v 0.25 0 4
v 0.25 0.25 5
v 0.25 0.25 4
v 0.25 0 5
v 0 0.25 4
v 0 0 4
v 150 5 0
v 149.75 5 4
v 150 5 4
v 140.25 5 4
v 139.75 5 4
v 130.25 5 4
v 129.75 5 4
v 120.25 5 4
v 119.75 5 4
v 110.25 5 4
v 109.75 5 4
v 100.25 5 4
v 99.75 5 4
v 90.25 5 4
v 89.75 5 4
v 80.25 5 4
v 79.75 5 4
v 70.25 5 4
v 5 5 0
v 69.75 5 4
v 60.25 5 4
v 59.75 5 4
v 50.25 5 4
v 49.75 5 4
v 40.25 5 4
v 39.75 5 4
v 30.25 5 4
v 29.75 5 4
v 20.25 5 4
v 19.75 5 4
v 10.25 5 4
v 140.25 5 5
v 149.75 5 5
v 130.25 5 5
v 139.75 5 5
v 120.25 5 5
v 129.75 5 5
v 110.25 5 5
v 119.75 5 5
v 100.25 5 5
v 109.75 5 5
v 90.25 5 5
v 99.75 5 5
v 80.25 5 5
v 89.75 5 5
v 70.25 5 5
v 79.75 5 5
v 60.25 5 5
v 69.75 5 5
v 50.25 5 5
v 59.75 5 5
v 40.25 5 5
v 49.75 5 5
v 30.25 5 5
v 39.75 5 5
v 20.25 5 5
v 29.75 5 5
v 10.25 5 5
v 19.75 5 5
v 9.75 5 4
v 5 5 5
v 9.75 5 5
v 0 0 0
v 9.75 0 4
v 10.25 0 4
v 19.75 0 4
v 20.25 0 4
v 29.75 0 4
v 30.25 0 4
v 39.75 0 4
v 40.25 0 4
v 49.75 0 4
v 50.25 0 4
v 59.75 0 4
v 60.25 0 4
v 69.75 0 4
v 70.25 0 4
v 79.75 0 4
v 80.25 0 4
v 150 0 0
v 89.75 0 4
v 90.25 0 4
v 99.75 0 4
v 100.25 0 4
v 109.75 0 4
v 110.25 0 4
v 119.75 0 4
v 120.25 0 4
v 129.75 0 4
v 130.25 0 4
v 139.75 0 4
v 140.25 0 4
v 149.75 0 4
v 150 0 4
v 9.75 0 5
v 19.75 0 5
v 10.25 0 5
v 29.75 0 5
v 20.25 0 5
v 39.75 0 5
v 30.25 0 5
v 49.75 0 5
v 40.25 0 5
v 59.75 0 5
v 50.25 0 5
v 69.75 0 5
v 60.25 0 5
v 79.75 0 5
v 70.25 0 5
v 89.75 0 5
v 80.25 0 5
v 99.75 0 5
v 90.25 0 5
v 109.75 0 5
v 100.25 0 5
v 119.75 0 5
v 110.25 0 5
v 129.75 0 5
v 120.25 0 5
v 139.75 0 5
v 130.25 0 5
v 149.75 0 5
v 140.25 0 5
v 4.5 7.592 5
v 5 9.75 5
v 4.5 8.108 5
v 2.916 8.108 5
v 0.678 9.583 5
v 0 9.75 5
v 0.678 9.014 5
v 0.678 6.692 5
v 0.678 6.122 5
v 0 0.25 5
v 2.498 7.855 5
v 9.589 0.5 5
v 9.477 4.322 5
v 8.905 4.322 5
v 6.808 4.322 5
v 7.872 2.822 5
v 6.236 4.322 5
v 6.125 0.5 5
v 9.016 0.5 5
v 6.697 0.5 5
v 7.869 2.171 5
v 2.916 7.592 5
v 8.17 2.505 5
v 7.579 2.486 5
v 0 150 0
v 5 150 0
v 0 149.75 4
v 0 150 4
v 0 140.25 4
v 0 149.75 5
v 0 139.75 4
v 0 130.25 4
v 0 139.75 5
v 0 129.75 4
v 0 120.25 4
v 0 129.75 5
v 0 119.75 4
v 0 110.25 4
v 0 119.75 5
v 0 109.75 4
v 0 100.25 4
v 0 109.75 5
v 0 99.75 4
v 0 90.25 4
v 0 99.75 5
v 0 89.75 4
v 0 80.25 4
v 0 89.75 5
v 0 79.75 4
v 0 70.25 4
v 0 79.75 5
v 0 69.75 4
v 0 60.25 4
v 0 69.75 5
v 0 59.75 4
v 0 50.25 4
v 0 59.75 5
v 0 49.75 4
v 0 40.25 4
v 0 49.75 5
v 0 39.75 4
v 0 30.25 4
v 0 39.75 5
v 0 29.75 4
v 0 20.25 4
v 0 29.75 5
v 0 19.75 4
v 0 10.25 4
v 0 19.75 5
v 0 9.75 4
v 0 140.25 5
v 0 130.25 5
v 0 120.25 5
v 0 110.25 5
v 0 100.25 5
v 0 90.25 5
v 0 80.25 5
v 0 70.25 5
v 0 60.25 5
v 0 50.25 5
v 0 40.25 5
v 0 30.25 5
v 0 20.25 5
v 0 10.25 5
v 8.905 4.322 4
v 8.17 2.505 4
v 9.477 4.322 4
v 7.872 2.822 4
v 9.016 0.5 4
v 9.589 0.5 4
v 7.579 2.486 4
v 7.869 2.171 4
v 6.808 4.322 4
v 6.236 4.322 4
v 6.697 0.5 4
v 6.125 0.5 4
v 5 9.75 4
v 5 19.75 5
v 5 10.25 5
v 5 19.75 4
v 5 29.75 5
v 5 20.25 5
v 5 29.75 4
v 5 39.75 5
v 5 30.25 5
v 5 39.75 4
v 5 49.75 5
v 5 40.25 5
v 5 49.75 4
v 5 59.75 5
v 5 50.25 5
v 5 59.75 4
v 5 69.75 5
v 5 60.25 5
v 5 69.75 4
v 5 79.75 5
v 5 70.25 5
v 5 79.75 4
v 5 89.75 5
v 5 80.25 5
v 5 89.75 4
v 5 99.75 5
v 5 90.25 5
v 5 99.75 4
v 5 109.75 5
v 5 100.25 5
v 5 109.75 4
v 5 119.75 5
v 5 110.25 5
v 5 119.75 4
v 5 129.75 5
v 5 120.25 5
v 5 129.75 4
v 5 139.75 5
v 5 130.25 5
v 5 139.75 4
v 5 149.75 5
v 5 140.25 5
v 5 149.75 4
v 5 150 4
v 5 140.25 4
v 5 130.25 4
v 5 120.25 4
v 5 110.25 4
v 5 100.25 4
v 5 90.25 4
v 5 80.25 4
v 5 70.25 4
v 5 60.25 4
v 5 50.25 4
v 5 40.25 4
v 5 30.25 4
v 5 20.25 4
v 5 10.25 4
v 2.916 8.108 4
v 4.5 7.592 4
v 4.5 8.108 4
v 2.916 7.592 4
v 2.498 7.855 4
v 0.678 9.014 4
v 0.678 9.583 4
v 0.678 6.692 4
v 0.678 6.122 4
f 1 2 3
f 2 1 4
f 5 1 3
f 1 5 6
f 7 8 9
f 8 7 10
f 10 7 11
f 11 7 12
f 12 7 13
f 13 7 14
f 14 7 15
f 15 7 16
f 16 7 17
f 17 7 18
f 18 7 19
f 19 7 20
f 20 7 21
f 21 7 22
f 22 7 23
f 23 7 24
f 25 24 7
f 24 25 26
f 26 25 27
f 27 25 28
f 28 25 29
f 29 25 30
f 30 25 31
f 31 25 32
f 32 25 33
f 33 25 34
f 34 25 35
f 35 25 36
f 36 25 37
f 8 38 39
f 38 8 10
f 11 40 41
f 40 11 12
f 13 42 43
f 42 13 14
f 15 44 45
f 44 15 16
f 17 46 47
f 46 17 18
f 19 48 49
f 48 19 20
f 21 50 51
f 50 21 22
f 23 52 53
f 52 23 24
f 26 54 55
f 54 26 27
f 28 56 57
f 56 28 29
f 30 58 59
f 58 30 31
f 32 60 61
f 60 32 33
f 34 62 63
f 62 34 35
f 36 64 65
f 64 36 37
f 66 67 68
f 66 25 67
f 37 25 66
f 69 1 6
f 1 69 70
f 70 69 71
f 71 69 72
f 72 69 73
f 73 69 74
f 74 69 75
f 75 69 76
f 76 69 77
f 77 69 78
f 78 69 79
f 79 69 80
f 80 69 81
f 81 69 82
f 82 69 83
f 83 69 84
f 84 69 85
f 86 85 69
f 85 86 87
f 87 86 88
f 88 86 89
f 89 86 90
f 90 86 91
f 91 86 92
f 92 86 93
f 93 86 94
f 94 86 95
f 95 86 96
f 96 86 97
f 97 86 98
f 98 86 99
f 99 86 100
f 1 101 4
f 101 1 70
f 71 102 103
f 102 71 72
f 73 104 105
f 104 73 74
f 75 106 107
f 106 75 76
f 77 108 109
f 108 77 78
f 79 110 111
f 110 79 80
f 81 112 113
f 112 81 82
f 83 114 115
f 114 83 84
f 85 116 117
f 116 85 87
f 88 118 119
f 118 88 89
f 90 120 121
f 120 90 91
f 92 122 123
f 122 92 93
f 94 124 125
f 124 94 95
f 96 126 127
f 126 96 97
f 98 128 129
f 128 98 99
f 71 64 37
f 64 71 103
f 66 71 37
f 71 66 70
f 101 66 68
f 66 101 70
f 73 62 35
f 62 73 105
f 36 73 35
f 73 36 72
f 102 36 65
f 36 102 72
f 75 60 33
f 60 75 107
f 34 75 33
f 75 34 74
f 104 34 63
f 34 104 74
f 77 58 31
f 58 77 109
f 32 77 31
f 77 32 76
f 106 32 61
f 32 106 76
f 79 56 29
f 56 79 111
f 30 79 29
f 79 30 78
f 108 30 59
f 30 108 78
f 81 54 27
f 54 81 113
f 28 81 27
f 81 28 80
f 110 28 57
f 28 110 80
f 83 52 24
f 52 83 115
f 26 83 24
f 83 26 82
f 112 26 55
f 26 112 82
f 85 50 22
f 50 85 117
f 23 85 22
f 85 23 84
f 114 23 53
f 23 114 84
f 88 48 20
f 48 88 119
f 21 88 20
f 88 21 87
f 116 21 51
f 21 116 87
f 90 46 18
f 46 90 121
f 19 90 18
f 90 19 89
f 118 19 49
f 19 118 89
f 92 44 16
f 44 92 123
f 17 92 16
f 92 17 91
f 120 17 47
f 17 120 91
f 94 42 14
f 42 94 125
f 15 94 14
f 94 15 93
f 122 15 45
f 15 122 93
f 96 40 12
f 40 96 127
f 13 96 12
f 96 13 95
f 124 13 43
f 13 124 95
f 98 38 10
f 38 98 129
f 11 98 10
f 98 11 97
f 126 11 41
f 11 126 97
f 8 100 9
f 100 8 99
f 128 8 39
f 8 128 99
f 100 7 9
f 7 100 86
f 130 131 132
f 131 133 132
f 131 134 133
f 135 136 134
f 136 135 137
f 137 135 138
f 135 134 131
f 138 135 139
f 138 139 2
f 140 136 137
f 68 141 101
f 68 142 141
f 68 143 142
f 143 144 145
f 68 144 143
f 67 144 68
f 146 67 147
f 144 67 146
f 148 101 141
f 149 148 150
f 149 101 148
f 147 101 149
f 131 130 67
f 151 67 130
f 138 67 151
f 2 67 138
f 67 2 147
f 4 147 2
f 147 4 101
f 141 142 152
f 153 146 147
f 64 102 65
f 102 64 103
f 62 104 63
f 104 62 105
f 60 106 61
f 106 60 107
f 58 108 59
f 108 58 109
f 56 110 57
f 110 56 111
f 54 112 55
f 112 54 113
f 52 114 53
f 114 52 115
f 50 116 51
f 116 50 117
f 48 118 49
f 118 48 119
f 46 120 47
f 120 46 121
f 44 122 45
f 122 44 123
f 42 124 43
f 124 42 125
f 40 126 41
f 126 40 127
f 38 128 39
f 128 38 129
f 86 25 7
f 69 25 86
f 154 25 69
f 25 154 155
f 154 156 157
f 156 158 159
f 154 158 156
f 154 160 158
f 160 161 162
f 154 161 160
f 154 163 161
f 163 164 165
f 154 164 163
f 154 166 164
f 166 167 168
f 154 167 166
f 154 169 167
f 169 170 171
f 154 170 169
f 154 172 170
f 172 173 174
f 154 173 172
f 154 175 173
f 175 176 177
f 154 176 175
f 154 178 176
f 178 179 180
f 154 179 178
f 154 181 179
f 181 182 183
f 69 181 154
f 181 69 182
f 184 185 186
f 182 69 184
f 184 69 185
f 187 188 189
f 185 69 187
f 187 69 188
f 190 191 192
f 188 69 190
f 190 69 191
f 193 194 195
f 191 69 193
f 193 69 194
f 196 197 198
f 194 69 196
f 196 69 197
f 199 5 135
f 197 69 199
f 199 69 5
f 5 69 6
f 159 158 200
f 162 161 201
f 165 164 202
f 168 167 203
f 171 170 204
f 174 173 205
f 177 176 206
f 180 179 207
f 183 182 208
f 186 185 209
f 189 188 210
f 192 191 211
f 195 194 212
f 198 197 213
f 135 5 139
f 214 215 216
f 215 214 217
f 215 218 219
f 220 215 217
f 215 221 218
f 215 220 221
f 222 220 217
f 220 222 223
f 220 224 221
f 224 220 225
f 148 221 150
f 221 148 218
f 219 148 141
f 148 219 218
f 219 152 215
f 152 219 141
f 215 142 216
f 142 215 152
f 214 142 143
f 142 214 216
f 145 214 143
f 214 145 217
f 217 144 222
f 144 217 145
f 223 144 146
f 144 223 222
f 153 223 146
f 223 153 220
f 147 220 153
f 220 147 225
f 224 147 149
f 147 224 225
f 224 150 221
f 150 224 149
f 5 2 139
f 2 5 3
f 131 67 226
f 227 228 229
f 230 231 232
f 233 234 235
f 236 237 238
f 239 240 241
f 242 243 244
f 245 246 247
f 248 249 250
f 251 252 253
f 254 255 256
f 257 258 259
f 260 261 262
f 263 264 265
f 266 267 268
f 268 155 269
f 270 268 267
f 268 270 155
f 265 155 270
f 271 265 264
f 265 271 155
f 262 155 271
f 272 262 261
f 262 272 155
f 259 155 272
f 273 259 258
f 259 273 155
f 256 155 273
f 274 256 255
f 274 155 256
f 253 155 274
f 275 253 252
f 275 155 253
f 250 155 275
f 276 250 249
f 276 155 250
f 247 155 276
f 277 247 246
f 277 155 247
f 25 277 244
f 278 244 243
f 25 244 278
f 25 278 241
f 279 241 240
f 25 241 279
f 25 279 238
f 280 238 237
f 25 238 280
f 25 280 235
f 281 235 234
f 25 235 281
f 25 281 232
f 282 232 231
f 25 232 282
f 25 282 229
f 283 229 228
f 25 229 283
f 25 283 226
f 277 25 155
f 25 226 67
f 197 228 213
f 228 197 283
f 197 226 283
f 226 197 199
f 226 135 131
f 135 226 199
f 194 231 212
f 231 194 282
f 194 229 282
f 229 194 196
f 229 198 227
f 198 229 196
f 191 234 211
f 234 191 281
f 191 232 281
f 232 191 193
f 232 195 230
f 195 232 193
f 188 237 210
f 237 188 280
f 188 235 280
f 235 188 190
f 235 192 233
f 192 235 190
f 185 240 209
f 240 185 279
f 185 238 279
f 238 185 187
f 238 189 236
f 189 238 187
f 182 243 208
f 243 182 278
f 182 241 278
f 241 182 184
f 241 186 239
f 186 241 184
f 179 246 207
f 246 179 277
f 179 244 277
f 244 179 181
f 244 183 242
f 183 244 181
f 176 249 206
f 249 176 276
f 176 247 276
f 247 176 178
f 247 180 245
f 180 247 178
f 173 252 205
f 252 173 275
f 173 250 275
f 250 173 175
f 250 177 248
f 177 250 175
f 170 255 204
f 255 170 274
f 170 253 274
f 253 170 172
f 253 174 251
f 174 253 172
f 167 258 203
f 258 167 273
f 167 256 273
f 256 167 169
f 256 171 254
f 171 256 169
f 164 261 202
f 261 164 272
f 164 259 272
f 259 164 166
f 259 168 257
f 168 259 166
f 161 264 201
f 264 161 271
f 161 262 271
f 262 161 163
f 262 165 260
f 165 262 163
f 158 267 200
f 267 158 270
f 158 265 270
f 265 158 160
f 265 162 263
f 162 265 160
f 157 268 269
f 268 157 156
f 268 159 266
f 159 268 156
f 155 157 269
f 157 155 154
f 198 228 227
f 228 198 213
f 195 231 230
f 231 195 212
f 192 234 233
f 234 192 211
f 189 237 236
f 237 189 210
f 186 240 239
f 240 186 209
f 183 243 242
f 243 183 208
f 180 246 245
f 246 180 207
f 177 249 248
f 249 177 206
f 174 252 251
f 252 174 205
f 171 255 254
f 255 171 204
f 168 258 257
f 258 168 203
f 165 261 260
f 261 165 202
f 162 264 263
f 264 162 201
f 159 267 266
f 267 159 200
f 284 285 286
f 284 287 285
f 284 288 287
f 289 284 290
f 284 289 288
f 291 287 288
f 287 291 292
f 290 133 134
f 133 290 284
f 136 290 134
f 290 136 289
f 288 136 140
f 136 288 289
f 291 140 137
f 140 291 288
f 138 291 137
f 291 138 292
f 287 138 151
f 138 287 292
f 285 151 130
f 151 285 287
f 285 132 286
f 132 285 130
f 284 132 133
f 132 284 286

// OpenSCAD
//Size of X rule
sizeX=150;

//Size of Y rule
sizeY=150;

//Size of rule marks
markWidth=0.5;

//Milimeters for each mark
markStep=10;

//Laabel on X rule
labelX="X";

//Label on Y rule
labelY="Y";


module rule(lng,name){
	difference(){
		cube([lng,5,5]);
		for(i=[0:markStep:lng]){
			translate([i-(markWidth/2),0,4])
			cube([markWidth,5,2]);
		}
		translate([6,0.5,4])
		linear_extrude(4)
			text(name,size=4);
	}
}

rule(sizeX,labelX);
translate([5,0,0])
rotate([0,0,90])
rule(sizeY,labelY);
